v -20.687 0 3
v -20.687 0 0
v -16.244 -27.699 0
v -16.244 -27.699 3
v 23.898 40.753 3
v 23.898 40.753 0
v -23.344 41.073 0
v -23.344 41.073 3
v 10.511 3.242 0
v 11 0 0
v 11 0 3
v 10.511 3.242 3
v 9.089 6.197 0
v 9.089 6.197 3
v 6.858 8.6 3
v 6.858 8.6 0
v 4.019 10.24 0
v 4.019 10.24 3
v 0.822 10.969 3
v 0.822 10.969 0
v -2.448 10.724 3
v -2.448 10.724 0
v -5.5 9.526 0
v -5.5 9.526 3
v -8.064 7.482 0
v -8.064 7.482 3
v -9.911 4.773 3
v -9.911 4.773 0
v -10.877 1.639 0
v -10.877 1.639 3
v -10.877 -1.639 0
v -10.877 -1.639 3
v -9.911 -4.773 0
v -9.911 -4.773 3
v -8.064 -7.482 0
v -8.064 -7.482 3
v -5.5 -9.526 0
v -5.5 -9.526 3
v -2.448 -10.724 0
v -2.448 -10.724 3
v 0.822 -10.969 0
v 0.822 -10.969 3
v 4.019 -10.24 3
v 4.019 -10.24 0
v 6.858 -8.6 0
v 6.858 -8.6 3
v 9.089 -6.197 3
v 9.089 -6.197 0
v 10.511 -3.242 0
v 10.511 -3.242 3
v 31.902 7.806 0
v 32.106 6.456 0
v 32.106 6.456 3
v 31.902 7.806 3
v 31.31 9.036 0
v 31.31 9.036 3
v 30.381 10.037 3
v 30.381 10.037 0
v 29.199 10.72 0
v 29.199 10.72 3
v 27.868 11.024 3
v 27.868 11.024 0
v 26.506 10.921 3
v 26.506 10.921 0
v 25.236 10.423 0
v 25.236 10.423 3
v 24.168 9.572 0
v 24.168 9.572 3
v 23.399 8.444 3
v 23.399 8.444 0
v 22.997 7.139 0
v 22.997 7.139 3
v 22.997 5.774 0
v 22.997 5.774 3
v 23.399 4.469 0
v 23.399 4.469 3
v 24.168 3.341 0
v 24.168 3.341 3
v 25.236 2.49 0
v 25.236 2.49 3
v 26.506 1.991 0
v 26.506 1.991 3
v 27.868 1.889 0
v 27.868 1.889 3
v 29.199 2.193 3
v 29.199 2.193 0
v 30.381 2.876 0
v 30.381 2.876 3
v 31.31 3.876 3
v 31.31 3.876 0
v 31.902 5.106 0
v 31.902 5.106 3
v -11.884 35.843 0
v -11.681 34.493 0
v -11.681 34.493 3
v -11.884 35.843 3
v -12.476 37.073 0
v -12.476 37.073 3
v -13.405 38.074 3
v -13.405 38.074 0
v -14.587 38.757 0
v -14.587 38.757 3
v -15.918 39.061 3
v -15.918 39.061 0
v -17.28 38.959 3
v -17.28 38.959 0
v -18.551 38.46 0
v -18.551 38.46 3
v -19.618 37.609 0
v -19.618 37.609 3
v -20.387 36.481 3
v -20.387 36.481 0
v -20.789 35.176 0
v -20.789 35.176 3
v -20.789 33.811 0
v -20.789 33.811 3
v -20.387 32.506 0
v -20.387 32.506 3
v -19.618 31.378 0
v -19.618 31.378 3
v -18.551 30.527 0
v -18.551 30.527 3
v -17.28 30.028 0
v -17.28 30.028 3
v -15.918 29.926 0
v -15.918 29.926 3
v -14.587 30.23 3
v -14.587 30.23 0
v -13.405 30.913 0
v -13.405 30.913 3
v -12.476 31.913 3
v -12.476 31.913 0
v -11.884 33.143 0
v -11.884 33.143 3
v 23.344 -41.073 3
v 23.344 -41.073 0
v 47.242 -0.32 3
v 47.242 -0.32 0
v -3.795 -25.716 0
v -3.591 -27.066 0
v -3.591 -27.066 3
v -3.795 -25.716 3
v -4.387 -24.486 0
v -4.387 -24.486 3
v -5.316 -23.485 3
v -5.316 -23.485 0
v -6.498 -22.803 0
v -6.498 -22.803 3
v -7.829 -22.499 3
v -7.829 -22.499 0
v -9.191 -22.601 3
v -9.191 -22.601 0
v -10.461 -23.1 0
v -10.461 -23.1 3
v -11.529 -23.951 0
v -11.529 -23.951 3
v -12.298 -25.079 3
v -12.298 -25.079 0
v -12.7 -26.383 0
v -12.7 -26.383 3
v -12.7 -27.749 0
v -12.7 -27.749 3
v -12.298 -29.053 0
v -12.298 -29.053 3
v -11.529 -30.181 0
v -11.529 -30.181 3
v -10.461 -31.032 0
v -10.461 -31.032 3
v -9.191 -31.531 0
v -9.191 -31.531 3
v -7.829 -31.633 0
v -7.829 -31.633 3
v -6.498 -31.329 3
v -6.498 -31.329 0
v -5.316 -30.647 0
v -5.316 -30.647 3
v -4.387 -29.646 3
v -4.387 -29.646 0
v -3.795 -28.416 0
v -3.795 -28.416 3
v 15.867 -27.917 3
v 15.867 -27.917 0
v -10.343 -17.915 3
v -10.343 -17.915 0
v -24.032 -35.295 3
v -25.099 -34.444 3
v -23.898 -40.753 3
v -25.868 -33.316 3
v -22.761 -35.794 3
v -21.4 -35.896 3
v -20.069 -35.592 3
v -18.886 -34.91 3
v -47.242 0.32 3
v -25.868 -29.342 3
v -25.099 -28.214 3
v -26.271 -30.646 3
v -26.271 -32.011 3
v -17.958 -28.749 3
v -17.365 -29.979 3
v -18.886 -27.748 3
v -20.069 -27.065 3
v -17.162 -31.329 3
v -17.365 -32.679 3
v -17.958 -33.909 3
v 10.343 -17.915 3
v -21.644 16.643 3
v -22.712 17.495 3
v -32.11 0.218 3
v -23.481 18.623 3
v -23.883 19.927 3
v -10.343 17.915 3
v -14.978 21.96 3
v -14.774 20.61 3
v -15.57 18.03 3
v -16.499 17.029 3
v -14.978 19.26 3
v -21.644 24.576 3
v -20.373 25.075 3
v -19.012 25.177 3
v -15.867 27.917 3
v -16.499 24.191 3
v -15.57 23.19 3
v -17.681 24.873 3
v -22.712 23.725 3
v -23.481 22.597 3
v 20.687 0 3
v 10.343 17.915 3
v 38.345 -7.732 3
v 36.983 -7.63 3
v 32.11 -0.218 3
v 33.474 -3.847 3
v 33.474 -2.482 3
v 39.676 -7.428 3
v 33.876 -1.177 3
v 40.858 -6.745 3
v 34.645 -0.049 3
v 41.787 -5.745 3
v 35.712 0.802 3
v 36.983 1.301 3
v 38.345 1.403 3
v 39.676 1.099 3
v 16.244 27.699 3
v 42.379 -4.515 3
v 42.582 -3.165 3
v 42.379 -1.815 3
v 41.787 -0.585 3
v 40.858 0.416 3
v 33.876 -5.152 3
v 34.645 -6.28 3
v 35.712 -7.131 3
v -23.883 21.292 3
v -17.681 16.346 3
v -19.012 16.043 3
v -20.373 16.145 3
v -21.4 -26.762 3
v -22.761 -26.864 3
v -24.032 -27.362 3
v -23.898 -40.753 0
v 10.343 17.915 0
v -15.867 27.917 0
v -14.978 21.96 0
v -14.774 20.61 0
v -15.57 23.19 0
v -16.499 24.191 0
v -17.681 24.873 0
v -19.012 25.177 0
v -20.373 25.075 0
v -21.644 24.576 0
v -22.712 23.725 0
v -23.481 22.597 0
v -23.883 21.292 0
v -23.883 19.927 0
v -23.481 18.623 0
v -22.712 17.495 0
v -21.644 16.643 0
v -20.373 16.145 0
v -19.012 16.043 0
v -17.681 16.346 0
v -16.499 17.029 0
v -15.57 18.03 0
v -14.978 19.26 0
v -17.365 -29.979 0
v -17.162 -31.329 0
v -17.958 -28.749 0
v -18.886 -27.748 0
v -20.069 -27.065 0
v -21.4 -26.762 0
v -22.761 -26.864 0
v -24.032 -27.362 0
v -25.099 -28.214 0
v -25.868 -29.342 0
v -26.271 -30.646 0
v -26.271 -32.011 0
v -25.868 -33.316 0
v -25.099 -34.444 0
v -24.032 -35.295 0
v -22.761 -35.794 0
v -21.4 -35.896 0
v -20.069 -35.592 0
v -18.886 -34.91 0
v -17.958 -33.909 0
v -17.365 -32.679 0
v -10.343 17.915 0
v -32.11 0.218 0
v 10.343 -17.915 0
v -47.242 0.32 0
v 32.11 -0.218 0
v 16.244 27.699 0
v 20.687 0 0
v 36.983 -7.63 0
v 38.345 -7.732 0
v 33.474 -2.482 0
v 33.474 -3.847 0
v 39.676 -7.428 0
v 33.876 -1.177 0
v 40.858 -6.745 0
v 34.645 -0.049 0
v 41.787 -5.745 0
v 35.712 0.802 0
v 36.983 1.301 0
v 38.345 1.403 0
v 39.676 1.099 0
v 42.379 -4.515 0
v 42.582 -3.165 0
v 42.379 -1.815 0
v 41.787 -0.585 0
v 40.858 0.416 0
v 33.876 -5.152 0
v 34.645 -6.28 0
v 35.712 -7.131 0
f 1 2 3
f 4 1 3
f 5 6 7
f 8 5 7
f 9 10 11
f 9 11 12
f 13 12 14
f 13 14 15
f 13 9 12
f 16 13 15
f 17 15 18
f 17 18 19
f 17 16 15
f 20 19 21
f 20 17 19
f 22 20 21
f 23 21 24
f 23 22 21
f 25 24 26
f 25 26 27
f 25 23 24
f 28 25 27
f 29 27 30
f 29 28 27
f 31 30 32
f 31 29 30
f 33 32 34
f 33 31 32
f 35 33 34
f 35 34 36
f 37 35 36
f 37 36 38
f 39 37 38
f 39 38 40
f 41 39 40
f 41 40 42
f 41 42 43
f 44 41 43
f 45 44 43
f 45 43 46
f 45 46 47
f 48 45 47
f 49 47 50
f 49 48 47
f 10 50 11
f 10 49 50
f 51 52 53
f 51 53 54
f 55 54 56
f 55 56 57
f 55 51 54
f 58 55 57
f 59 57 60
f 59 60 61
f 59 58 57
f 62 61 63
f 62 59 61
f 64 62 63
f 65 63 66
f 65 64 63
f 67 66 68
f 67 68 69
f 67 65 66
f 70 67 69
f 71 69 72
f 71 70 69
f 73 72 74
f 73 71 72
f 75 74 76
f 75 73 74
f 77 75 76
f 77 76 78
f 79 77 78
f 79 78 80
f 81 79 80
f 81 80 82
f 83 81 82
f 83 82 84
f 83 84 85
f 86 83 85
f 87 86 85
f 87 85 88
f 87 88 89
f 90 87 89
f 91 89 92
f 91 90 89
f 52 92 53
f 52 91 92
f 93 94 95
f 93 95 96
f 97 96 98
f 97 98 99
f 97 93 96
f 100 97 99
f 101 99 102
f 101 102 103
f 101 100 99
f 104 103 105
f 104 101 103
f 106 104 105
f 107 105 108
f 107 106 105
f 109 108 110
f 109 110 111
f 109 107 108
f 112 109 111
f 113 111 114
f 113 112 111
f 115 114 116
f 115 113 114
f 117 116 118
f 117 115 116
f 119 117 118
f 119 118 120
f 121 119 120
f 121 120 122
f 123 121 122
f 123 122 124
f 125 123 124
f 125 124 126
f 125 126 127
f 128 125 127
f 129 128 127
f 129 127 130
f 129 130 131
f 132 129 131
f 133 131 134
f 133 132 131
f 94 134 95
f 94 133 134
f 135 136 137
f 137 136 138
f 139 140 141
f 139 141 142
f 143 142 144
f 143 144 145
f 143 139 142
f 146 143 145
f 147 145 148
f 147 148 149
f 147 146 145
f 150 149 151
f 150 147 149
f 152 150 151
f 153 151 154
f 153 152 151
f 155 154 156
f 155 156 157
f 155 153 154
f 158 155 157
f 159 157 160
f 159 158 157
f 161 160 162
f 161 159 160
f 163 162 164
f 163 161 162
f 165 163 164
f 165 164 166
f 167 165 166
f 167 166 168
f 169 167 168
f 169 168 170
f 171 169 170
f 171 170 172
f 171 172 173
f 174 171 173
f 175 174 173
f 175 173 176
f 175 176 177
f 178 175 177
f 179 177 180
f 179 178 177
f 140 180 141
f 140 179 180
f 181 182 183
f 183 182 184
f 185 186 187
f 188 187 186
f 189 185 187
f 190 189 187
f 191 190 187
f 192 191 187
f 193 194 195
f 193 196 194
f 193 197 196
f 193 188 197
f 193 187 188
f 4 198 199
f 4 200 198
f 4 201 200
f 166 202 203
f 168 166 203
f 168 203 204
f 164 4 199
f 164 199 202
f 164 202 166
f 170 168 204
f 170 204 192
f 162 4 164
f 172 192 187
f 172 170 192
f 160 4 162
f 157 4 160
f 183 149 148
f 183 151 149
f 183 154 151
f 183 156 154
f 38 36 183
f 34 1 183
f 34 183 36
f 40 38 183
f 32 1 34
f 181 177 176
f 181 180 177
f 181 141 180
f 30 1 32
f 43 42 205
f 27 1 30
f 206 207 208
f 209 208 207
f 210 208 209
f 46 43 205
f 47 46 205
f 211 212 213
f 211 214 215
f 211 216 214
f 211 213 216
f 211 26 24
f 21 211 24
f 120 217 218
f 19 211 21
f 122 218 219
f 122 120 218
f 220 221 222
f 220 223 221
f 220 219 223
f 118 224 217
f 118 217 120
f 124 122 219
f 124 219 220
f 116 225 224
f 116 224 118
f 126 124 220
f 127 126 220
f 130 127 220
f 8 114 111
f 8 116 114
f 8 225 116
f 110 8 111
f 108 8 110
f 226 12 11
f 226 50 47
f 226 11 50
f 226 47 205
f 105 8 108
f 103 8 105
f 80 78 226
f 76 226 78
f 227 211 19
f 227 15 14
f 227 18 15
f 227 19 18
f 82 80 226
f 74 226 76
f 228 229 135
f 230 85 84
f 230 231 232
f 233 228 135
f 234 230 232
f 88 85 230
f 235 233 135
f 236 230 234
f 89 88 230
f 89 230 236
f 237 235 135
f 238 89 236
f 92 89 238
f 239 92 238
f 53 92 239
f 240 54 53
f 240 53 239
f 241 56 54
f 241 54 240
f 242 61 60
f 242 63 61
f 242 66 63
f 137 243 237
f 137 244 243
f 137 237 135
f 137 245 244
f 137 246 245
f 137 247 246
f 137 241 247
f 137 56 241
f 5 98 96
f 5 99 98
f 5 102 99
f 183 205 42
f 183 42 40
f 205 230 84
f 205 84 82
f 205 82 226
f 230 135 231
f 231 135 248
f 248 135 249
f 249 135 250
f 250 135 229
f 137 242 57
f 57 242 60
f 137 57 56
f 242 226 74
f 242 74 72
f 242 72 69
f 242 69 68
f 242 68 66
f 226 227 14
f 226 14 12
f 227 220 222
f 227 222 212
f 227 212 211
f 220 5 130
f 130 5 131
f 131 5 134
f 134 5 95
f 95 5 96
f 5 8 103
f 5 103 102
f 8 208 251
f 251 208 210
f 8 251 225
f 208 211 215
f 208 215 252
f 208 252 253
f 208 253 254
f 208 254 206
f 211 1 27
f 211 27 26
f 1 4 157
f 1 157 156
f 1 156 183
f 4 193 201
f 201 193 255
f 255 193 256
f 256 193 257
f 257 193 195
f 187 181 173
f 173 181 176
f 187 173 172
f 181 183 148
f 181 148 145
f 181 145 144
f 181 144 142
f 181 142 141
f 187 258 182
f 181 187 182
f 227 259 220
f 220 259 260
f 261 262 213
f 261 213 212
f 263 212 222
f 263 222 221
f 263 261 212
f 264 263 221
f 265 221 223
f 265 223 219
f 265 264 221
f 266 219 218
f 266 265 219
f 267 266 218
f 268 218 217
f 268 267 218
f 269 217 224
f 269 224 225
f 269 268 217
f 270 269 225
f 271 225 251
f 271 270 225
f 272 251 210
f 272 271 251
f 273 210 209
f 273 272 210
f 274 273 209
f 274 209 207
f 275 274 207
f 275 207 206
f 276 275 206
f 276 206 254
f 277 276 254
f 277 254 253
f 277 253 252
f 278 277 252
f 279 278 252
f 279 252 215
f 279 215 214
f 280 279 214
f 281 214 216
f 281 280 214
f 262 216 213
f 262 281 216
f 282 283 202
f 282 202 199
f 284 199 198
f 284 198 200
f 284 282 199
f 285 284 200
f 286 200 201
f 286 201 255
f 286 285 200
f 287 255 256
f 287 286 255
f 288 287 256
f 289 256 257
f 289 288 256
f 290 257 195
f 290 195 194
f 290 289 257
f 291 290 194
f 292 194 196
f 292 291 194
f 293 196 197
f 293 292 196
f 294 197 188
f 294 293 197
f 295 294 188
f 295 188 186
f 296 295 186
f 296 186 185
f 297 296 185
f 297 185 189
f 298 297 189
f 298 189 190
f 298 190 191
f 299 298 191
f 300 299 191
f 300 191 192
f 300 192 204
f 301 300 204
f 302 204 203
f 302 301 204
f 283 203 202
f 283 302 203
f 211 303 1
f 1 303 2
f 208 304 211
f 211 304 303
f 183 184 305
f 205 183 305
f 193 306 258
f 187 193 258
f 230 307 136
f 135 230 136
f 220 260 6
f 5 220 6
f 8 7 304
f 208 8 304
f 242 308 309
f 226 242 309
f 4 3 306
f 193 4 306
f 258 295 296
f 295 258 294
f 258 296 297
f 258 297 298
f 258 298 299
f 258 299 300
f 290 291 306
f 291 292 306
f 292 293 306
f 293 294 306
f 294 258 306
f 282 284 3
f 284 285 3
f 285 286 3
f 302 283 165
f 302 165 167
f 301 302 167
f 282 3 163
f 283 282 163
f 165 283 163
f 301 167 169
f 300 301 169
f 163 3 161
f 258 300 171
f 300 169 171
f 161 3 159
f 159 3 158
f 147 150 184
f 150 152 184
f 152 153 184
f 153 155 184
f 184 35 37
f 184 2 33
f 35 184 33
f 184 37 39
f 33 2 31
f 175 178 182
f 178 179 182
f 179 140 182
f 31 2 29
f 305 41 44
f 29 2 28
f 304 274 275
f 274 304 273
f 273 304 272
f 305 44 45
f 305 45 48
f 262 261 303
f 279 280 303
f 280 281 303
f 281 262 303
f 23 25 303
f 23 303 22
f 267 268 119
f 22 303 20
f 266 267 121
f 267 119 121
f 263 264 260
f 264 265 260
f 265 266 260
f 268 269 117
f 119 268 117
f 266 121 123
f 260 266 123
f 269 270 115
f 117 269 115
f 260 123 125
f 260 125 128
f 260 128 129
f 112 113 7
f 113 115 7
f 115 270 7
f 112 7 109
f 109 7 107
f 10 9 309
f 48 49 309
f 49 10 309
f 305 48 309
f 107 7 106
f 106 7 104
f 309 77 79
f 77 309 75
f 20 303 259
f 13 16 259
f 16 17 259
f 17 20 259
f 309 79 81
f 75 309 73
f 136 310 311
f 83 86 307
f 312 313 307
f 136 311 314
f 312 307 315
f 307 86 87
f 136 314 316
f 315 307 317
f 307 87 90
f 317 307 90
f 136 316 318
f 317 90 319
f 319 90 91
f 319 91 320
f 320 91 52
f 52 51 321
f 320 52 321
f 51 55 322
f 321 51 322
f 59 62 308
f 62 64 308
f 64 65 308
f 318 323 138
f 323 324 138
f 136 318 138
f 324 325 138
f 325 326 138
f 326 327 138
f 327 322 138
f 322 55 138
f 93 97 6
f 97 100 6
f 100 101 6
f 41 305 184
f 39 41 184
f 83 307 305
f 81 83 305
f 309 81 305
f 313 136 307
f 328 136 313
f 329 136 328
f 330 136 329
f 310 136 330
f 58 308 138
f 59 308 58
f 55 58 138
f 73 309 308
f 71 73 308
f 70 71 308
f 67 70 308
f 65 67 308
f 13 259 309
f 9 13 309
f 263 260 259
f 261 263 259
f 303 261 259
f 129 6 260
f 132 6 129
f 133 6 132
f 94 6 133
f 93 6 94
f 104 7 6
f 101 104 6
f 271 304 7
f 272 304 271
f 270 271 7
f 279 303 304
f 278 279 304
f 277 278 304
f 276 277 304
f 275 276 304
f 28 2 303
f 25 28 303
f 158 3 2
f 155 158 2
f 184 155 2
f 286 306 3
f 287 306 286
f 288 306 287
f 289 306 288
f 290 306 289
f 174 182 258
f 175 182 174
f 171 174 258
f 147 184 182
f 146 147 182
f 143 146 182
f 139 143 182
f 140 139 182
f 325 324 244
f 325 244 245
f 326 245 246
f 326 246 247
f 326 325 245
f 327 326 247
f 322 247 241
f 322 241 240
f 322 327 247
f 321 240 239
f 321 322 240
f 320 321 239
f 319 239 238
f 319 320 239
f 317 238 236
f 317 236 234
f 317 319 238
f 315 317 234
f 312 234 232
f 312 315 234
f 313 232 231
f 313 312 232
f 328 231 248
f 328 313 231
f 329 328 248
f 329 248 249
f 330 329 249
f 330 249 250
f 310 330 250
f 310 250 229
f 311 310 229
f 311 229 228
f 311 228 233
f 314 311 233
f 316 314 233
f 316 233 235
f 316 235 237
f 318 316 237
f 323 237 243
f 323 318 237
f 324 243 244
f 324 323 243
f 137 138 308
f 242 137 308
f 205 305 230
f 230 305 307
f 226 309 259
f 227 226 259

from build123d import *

# Parameters (mm, degrees)
F0_R     = 4.58
F0_R_2   = 11
F1_DEPTH = 3


with BuildPart() as f1:
    # F0 (on Top) → F1 (new body)
    with BuildSketch(Plane.XY):
        Polygon((-10.3433931154, -17.9152823985), (10.3433931154, -17.9152823985), (32.1102169209, -0.2177119583), (23.3435776075, -41.0728769962), (47.241943689, -0.3203072748), (16.2436525471, 27.6994075954), (20.6867862307, 0), (10.3433931154, 17.9152823985), (-15.8665643739, 27.9171195537), (23.8983660815, 40.7525697215), (-23.3435776075, 41.0728769962), (-32.1102169209, 0.2177119583), (-10.3433931154, 17.9152823985), (-20.6867862307, 0), (-16.2436525471, -27.6994075954), (-47.241943689, 0.3203072748), (-23.8983660815, -40.7525697215), (15.8665643739, -27.9171195537), align=None)
        with Locations((-21.741848439, -31.328804791)):
            Circle(F0_R, mode=Mode.SUBTRACT)
        with Locations((-8.1714619327, -27.0660405942)):
            Circle(F0_R, mode=Mode.SUBTRACT)
        Circle(F0_R_2, mode=Mode.SUBTRACT)
        with Locations((38.0024650387, -3.1645906779)):
            Circle(F0_R, mode=Mode.SUBTRACT)
        with Locations((-19.3541477681, 20.6097139168)):
            Circle(F0_R, mode=Mode.SUBTRACT)
        with Locations((-16.2606165997, 34.4933954689)):
            Circle(F0_R, mode=Mode.SUBTRACT)
        with Locations((27.5256097008, 6.4563266774)):
            Circle(F0_R, mode=Mode.SUBTRACT)
    extrude(amount=F1_DEPTH)


solid = f1.part
